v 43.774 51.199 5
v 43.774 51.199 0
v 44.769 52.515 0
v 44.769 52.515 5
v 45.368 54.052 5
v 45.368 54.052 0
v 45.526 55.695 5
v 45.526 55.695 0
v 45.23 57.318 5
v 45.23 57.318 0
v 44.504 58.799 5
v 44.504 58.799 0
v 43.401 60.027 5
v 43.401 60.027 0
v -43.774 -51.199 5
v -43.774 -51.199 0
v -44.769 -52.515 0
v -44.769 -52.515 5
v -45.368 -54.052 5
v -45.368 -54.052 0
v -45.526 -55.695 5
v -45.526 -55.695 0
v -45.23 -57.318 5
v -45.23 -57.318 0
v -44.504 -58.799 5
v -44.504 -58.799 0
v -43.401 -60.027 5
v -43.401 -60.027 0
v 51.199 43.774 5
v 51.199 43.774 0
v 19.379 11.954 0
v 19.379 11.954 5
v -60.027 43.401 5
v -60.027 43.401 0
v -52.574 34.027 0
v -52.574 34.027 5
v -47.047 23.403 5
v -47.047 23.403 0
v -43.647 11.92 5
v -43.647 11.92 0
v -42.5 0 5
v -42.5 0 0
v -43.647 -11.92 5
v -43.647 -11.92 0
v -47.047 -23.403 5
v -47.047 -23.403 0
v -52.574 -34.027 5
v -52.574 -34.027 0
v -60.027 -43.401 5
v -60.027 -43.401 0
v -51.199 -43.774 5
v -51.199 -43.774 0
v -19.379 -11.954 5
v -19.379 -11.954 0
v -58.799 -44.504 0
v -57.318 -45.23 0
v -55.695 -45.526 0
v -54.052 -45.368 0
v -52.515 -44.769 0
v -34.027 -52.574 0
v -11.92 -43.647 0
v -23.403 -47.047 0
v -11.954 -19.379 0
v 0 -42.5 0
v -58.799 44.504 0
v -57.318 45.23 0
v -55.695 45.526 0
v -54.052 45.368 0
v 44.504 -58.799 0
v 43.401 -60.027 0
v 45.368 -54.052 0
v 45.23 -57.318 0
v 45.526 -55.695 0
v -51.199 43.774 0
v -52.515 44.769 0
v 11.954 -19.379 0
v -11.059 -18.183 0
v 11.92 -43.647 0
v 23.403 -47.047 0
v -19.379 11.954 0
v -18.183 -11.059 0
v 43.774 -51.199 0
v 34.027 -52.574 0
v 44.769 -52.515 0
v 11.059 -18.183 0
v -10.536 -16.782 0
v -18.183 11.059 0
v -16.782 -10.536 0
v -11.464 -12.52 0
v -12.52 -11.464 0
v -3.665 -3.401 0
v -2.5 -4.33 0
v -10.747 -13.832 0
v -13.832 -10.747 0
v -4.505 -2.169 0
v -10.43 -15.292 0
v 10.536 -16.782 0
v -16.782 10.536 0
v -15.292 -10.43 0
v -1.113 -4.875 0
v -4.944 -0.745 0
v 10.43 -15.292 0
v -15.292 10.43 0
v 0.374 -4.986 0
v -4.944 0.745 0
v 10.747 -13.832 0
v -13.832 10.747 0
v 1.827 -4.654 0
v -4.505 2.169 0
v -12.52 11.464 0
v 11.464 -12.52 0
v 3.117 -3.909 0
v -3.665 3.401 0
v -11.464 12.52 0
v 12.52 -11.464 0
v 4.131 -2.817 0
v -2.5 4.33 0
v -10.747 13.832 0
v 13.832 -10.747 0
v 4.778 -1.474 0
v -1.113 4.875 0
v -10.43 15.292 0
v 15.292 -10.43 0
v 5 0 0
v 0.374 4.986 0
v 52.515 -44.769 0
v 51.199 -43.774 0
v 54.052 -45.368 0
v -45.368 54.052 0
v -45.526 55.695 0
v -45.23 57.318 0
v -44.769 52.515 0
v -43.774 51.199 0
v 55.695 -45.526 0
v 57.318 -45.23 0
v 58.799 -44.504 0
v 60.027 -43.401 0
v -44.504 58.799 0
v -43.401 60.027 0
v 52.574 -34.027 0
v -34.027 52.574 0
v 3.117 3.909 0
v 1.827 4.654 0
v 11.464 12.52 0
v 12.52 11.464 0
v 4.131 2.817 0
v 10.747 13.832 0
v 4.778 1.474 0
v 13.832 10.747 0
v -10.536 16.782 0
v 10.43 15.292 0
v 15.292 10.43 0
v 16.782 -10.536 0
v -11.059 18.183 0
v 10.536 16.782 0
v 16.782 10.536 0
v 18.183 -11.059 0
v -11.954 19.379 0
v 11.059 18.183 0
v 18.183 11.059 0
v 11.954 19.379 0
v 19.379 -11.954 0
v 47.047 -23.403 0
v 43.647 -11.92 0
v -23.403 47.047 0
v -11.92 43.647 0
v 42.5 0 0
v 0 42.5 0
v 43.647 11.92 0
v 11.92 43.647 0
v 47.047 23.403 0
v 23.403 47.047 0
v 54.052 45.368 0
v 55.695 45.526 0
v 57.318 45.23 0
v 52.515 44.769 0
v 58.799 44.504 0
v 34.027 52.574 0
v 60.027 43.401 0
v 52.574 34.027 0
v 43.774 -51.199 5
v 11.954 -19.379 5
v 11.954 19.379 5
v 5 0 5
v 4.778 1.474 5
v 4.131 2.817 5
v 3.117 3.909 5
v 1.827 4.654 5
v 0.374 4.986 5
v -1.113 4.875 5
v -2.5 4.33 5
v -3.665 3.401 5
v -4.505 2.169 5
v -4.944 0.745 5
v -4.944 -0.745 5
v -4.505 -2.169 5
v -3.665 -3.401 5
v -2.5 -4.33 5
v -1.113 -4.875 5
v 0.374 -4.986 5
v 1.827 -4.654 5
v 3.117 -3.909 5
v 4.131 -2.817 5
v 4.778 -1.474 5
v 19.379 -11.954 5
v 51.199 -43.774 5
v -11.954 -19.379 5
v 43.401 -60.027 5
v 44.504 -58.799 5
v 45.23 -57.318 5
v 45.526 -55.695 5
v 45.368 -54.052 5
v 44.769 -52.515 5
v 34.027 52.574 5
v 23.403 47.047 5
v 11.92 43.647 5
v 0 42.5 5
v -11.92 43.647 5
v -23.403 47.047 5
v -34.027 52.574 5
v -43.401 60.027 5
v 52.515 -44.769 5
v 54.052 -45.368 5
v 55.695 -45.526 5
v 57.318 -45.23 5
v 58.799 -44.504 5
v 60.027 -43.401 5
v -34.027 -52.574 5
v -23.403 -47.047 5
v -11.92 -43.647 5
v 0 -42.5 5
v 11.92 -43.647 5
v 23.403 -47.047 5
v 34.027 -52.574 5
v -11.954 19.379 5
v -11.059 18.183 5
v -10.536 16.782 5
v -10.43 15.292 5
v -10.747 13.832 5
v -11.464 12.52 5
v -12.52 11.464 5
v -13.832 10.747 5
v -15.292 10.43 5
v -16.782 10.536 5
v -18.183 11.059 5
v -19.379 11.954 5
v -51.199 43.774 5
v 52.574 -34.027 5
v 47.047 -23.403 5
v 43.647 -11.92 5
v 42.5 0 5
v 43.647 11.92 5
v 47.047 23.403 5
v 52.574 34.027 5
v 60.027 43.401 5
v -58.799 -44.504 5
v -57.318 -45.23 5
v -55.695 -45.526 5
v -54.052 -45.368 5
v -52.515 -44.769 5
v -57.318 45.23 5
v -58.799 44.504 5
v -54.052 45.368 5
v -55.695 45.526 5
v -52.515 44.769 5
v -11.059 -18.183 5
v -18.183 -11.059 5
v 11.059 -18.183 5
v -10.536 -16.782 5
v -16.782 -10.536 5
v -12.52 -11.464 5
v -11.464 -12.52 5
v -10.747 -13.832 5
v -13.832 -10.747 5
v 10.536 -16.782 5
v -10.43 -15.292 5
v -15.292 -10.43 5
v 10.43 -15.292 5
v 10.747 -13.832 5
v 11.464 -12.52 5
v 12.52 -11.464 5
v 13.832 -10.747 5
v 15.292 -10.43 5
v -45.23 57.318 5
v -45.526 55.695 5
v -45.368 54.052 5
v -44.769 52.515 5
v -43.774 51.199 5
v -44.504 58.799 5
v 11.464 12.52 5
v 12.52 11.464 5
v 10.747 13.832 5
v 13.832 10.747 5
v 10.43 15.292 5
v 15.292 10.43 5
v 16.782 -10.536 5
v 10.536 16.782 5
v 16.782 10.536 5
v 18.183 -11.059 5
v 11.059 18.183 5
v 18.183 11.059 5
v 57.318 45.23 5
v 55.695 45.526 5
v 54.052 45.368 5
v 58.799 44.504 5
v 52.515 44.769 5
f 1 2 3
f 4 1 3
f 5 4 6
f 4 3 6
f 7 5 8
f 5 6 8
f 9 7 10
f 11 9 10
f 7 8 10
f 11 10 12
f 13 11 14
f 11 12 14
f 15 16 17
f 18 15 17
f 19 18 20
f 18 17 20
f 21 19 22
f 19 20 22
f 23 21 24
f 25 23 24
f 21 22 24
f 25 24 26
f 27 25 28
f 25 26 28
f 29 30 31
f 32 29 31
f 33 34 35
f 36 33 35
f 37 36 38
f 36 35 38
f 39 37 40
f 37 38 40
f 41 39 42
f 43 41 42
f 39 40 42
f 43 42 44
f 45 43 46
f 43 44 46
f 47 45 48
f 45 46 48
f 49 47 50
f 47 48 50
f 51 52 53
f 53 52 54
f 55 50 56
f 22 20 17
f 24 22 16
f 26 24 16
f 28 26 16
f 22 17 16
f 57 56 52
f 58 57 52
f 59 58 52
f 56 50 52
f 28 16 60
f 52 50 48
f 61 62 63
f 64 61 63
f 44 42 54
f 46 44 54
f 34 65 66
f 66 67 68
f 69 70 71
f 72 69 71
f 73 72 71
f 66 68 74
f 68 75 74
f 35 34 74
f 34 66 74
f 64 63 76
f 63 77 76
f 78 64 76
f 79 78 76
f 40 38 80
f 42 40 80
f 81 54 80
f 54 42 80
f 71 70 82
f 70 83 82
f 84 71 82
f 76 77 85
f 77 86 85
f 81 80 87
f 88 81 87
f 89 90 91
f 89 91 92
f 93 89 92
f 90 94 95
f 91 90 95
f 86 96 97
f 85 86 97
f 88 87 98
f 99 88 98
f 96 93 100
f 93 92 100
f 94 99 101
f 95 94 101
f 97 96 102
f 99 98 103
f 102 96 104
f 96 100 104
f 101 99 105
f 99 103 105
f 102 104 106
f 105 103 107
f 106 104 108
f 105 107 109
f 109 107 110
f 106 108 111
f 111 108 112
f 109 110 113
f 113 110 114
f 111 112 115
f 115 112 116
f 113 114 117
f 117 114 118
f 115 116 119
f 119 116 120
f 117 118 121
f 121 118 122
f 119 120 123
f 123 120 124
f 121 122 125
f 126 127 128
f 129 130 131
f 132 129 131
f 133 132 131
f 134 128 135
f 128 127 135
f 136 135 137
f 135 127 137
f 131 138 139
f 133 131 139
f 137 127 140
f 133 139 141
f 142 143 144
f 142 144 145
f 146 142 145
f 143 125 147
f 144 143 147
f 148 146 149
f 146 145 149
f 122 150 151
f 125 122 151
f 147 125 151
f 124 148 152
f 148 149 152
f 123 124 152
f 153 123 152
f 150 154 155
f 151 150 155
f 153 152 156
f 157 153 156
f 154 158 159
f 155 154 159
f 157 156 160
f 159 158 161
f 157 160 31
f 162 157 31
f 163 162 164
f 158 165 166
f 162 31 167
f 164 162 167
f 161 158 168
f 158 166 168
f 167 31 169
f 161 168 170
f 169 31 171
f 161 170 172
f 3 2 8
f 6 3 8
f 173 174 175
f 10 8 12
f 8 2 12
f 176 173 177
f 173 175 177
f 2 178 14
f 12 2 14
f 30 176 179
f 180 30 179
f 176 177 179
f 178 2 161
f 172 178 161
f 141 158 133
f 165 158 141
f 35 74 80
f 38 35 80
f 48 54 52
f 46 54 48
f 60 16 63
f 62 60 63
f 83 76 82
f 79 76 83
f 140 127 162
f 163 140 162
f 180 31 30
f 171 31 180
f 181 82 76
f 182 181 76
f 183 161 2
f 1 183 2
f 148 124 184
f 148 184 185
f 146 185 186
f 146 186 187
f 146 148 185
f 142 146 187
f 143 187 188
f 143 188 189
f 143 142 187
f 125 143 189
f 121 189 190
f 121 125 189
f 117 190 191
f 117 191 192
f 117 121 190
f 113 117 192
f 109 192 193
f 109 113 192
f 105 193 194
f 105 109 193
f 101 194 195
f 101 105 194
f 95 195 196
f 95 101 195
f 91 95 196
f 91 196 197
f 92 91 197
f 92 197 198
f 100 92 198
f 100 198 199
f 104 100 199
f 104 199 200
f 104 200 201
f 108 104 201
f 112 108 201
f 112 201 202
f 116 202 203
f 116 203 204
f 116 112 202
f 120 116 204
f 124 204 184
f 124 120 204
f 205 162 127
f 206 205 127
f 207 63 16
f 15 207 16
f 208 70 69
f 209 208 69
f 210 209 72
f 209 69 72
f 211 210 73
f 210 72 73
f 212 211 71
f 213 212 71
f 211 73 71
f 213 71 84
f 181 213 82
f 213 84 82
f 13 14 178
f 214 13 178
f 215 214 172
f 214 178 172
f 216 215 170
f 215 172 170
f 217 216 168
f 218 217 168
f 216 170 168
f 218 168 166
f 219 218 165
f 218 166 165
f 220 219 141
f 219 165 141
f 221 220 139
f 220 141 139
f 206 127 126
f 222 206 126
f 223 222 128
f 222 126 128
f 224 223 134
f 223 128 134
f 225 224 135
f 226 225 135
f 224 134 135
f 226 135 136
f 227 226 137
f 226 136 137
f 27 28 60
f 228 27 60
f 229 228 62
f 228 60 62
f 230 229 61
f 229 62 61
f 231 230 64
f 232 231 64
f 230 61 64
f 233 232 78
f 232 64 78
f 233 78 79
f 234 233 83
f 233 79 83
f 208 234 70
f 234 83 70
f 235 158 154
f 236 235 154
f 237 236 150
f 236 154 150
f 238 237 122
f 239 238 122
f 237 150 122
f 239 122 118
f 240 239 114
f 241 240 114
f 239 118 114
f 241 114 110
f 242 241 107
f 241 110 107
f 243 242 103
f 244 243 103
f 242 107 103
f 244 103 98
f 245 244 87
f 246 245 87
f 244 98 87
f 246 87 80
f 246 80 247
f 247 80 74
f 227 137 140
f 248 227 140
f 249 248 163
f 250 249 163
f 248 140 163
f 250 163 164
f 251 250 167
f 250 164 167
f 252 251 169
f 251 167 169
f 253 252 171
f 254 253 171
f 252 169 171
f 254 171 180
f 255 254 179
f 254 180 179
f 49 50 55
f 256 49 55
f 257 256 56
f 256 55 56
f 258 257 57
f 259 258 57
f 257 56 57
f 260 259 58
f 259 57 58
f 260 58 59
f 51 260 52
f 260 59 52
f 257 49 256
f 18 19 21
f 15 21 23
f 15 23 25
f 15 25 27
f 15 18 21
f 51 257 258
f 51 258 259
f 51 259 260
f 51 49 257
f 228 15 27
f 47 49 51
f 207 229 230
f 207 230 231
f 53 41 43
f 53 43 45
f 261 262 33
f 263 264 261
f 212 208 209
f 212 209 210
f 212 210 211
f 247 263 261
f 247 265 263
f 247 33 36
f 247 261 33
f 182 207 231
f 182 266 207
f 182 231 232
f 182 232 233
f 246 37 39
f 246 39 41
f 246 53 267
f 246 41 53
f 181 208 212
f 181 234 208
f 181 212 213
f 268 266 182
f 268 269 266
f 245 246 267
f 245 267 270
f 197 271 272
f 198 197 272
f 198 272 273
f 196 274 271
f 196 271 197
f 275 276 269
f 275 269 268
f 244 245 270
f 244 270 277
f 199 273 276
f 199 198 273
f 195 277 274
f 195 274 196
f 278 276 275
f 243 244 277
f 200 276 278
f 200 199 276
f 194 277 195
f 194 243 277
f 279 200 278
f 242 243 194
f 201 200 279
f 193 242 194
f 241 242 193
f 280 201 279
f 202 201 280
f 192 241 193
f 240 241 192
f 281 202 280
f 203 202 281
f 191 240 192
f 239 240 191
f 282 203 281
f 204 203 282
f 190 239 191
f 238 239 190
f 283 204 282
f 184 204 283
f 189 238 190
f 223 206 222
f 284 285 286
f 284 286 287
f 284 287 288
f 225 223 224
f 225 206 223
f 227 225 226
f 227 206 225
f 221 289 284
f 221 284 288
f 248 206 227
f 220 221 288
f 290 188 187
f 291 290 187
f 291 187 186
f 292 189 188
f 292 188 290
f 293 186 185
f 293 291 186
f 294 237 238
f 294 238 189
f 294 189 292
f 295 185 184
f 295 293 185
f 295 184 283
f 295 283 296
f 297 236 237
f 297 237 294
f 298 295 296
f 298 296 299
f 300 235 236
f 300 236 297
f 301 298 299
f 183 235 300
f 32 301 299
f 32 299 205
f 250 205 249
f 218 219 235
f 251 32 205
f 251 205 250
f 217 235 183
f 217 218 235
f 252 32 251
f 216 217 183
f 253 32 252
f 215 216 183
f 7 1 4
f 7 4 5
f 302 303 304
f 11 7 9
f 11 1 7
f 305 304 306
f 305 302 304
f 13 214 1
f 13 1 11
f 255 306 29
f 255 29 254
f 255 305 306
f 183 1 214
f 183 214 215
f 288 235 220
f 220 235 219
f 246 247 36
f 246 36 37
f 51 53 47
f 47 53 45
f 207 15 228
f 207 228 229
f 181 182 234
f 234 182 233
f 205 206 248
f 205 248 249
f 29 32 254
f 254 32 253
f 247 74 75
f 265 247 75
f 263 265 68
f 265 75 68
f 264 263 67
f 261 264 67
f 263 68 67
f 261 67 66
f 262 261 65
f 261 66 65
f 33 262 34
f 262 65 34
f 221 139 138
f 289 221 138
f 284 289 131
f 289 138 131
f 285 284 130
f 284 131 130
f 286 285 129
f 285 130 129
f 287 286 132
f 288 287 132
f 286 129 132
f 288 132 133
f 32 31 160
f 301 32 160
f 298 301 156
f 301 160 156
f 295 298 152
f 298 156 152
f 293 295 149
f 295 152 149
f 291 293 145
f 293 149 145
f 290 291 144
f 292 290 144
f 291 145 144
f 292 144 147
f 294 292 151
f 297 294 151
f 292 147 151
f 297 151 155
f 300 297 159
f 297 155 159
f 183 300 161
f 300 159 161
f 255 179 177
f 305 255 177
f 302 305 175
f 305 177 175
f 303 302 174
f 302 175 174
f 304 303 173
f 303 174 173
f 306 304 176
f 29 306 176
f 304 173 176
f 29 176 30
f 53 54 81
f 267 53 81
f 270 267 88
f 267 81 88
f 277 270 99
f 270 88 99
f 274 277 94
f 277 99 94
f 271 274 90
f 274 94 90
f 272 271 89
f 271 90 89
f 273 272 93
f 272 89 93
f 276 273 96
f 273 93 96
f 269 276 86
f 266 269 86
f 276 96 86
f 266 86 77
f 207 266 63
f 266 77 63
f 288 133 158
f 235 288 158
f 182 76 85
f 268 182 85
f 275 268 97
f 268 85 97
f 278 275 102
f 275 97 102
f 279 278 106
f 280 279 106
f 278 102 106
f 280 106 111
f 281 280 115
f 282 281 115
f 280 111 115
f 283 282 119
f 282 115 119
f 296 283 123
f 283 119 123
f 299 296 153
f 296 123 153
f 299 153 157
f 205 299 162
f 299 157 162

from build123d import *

# Parameters (mm, degrees)
SKICA1_R                = 5
P_IDAT_VYSUNUT_M1_DEPTH = 5


with BuildPart() as part:
    # Skica1 → Přidat vysunutím1 (new body)
    with BuildSketch(Plane.XY):
        with BuildLine():
            Line((11.954171039, 19.378792599), (43.773975828, 51.198598116))
            ThreePointArc((43.773975828, 51.198598116), (45.525986921, 55.694516194), (43.400986545, 60.026628339))
            ThreePointArc((43.400986545, 60.026628339), (5.05e-07, 42.500001775), (-43.400985944, 60.026627326))
            ThreePointArc((-43.400985944, 60.026627326), (-45.525987252, 55.694514886), (-43.77397602, 51.198596137))
            Line((-43.77397602, 51.198596137), (-11.954170503, 19.378791347))
            ThreePointArc((-11.954170503, 19.378791347), (-11.954171755, 11.954171481), (-19.378791621, 11.95417006))
            Line((-19.378791621, 11.95417006), (-51.198597038, 43.77397475))
            ThreePointArc((-51.198597038, 43.77397475), (-55.694514292, 45.525985877), (-60.026626197, 43.400986726))
            ThreePointArc((-60.026626197, 43.400986726), (-42.5, -1.49e-07), (-60.026626405, -43.400986941))
            ThreePointArc((-60.026626405, -43.400986941), (-55.694514208, -45.525987235), (-51.198596158, -43.773976041))
            Line((-51.198596158, -43.773976041), (-19.378791368, -11.954170524))
            ThreePointArc((-19.378791368, -11.954170524), (-11.954170343, -11.954171064), (-11.954170848, -19.378792089))
            Line((-11.954170848, -19.378792089), (-43.773975638, -51.198597606))
            ThreePointArc((-43.773975638, -51.198597606), (-45.52598669, -55.694515634), (-43.400986372, -60.026627739))
            ThreePointArc((-43.400986372, -60.026627739), (-7.5e-08, -42.500001775), (43.400986138, -60.026627946))
            ThreePointArc((43.400986138, -60.026627946), (45.525987031, -55.694515759), (43.773976041, -51.198597357))
            Line((43.773976041, -51.198597357), (11.954170524, -19.378792567))
            ThreePointArc((11.954170524, -19.378792567), (11.954170439, -11.954170166), (19.378792841, -11.954170081))
            Line((19.378792841, -11.954170081), (51.198597688, -43.773974201))
            ThreePointArc((51.198597688, -43.773974201), (55.694514488, -45.525985242), (60.026626197, -43.400986726))
            ThreePointArc((60.026626197, -43.400986726), (42.5, 8.27e-07), (60.026627347, 43.400987917))
            ThreePointArc((60.026627347, 43.400987917), (55.694515153, 45.525988194), (51.198597116, 43.773976998))
            Line((51.198597116, 43.773976998), (19.378792326, 11.954171481))
            ThreePointArc((19.378792326, 11.954171481), (11.954171123, 11.954171397), (11.954171039, 19.378792599))
        make_face()
        Circle(SKICA1_R, mode=Mode.SUBTRACT)
    extrude(amount=P_IDAT_VYSUNUT_M1_DEPTH)


solid = part.part
